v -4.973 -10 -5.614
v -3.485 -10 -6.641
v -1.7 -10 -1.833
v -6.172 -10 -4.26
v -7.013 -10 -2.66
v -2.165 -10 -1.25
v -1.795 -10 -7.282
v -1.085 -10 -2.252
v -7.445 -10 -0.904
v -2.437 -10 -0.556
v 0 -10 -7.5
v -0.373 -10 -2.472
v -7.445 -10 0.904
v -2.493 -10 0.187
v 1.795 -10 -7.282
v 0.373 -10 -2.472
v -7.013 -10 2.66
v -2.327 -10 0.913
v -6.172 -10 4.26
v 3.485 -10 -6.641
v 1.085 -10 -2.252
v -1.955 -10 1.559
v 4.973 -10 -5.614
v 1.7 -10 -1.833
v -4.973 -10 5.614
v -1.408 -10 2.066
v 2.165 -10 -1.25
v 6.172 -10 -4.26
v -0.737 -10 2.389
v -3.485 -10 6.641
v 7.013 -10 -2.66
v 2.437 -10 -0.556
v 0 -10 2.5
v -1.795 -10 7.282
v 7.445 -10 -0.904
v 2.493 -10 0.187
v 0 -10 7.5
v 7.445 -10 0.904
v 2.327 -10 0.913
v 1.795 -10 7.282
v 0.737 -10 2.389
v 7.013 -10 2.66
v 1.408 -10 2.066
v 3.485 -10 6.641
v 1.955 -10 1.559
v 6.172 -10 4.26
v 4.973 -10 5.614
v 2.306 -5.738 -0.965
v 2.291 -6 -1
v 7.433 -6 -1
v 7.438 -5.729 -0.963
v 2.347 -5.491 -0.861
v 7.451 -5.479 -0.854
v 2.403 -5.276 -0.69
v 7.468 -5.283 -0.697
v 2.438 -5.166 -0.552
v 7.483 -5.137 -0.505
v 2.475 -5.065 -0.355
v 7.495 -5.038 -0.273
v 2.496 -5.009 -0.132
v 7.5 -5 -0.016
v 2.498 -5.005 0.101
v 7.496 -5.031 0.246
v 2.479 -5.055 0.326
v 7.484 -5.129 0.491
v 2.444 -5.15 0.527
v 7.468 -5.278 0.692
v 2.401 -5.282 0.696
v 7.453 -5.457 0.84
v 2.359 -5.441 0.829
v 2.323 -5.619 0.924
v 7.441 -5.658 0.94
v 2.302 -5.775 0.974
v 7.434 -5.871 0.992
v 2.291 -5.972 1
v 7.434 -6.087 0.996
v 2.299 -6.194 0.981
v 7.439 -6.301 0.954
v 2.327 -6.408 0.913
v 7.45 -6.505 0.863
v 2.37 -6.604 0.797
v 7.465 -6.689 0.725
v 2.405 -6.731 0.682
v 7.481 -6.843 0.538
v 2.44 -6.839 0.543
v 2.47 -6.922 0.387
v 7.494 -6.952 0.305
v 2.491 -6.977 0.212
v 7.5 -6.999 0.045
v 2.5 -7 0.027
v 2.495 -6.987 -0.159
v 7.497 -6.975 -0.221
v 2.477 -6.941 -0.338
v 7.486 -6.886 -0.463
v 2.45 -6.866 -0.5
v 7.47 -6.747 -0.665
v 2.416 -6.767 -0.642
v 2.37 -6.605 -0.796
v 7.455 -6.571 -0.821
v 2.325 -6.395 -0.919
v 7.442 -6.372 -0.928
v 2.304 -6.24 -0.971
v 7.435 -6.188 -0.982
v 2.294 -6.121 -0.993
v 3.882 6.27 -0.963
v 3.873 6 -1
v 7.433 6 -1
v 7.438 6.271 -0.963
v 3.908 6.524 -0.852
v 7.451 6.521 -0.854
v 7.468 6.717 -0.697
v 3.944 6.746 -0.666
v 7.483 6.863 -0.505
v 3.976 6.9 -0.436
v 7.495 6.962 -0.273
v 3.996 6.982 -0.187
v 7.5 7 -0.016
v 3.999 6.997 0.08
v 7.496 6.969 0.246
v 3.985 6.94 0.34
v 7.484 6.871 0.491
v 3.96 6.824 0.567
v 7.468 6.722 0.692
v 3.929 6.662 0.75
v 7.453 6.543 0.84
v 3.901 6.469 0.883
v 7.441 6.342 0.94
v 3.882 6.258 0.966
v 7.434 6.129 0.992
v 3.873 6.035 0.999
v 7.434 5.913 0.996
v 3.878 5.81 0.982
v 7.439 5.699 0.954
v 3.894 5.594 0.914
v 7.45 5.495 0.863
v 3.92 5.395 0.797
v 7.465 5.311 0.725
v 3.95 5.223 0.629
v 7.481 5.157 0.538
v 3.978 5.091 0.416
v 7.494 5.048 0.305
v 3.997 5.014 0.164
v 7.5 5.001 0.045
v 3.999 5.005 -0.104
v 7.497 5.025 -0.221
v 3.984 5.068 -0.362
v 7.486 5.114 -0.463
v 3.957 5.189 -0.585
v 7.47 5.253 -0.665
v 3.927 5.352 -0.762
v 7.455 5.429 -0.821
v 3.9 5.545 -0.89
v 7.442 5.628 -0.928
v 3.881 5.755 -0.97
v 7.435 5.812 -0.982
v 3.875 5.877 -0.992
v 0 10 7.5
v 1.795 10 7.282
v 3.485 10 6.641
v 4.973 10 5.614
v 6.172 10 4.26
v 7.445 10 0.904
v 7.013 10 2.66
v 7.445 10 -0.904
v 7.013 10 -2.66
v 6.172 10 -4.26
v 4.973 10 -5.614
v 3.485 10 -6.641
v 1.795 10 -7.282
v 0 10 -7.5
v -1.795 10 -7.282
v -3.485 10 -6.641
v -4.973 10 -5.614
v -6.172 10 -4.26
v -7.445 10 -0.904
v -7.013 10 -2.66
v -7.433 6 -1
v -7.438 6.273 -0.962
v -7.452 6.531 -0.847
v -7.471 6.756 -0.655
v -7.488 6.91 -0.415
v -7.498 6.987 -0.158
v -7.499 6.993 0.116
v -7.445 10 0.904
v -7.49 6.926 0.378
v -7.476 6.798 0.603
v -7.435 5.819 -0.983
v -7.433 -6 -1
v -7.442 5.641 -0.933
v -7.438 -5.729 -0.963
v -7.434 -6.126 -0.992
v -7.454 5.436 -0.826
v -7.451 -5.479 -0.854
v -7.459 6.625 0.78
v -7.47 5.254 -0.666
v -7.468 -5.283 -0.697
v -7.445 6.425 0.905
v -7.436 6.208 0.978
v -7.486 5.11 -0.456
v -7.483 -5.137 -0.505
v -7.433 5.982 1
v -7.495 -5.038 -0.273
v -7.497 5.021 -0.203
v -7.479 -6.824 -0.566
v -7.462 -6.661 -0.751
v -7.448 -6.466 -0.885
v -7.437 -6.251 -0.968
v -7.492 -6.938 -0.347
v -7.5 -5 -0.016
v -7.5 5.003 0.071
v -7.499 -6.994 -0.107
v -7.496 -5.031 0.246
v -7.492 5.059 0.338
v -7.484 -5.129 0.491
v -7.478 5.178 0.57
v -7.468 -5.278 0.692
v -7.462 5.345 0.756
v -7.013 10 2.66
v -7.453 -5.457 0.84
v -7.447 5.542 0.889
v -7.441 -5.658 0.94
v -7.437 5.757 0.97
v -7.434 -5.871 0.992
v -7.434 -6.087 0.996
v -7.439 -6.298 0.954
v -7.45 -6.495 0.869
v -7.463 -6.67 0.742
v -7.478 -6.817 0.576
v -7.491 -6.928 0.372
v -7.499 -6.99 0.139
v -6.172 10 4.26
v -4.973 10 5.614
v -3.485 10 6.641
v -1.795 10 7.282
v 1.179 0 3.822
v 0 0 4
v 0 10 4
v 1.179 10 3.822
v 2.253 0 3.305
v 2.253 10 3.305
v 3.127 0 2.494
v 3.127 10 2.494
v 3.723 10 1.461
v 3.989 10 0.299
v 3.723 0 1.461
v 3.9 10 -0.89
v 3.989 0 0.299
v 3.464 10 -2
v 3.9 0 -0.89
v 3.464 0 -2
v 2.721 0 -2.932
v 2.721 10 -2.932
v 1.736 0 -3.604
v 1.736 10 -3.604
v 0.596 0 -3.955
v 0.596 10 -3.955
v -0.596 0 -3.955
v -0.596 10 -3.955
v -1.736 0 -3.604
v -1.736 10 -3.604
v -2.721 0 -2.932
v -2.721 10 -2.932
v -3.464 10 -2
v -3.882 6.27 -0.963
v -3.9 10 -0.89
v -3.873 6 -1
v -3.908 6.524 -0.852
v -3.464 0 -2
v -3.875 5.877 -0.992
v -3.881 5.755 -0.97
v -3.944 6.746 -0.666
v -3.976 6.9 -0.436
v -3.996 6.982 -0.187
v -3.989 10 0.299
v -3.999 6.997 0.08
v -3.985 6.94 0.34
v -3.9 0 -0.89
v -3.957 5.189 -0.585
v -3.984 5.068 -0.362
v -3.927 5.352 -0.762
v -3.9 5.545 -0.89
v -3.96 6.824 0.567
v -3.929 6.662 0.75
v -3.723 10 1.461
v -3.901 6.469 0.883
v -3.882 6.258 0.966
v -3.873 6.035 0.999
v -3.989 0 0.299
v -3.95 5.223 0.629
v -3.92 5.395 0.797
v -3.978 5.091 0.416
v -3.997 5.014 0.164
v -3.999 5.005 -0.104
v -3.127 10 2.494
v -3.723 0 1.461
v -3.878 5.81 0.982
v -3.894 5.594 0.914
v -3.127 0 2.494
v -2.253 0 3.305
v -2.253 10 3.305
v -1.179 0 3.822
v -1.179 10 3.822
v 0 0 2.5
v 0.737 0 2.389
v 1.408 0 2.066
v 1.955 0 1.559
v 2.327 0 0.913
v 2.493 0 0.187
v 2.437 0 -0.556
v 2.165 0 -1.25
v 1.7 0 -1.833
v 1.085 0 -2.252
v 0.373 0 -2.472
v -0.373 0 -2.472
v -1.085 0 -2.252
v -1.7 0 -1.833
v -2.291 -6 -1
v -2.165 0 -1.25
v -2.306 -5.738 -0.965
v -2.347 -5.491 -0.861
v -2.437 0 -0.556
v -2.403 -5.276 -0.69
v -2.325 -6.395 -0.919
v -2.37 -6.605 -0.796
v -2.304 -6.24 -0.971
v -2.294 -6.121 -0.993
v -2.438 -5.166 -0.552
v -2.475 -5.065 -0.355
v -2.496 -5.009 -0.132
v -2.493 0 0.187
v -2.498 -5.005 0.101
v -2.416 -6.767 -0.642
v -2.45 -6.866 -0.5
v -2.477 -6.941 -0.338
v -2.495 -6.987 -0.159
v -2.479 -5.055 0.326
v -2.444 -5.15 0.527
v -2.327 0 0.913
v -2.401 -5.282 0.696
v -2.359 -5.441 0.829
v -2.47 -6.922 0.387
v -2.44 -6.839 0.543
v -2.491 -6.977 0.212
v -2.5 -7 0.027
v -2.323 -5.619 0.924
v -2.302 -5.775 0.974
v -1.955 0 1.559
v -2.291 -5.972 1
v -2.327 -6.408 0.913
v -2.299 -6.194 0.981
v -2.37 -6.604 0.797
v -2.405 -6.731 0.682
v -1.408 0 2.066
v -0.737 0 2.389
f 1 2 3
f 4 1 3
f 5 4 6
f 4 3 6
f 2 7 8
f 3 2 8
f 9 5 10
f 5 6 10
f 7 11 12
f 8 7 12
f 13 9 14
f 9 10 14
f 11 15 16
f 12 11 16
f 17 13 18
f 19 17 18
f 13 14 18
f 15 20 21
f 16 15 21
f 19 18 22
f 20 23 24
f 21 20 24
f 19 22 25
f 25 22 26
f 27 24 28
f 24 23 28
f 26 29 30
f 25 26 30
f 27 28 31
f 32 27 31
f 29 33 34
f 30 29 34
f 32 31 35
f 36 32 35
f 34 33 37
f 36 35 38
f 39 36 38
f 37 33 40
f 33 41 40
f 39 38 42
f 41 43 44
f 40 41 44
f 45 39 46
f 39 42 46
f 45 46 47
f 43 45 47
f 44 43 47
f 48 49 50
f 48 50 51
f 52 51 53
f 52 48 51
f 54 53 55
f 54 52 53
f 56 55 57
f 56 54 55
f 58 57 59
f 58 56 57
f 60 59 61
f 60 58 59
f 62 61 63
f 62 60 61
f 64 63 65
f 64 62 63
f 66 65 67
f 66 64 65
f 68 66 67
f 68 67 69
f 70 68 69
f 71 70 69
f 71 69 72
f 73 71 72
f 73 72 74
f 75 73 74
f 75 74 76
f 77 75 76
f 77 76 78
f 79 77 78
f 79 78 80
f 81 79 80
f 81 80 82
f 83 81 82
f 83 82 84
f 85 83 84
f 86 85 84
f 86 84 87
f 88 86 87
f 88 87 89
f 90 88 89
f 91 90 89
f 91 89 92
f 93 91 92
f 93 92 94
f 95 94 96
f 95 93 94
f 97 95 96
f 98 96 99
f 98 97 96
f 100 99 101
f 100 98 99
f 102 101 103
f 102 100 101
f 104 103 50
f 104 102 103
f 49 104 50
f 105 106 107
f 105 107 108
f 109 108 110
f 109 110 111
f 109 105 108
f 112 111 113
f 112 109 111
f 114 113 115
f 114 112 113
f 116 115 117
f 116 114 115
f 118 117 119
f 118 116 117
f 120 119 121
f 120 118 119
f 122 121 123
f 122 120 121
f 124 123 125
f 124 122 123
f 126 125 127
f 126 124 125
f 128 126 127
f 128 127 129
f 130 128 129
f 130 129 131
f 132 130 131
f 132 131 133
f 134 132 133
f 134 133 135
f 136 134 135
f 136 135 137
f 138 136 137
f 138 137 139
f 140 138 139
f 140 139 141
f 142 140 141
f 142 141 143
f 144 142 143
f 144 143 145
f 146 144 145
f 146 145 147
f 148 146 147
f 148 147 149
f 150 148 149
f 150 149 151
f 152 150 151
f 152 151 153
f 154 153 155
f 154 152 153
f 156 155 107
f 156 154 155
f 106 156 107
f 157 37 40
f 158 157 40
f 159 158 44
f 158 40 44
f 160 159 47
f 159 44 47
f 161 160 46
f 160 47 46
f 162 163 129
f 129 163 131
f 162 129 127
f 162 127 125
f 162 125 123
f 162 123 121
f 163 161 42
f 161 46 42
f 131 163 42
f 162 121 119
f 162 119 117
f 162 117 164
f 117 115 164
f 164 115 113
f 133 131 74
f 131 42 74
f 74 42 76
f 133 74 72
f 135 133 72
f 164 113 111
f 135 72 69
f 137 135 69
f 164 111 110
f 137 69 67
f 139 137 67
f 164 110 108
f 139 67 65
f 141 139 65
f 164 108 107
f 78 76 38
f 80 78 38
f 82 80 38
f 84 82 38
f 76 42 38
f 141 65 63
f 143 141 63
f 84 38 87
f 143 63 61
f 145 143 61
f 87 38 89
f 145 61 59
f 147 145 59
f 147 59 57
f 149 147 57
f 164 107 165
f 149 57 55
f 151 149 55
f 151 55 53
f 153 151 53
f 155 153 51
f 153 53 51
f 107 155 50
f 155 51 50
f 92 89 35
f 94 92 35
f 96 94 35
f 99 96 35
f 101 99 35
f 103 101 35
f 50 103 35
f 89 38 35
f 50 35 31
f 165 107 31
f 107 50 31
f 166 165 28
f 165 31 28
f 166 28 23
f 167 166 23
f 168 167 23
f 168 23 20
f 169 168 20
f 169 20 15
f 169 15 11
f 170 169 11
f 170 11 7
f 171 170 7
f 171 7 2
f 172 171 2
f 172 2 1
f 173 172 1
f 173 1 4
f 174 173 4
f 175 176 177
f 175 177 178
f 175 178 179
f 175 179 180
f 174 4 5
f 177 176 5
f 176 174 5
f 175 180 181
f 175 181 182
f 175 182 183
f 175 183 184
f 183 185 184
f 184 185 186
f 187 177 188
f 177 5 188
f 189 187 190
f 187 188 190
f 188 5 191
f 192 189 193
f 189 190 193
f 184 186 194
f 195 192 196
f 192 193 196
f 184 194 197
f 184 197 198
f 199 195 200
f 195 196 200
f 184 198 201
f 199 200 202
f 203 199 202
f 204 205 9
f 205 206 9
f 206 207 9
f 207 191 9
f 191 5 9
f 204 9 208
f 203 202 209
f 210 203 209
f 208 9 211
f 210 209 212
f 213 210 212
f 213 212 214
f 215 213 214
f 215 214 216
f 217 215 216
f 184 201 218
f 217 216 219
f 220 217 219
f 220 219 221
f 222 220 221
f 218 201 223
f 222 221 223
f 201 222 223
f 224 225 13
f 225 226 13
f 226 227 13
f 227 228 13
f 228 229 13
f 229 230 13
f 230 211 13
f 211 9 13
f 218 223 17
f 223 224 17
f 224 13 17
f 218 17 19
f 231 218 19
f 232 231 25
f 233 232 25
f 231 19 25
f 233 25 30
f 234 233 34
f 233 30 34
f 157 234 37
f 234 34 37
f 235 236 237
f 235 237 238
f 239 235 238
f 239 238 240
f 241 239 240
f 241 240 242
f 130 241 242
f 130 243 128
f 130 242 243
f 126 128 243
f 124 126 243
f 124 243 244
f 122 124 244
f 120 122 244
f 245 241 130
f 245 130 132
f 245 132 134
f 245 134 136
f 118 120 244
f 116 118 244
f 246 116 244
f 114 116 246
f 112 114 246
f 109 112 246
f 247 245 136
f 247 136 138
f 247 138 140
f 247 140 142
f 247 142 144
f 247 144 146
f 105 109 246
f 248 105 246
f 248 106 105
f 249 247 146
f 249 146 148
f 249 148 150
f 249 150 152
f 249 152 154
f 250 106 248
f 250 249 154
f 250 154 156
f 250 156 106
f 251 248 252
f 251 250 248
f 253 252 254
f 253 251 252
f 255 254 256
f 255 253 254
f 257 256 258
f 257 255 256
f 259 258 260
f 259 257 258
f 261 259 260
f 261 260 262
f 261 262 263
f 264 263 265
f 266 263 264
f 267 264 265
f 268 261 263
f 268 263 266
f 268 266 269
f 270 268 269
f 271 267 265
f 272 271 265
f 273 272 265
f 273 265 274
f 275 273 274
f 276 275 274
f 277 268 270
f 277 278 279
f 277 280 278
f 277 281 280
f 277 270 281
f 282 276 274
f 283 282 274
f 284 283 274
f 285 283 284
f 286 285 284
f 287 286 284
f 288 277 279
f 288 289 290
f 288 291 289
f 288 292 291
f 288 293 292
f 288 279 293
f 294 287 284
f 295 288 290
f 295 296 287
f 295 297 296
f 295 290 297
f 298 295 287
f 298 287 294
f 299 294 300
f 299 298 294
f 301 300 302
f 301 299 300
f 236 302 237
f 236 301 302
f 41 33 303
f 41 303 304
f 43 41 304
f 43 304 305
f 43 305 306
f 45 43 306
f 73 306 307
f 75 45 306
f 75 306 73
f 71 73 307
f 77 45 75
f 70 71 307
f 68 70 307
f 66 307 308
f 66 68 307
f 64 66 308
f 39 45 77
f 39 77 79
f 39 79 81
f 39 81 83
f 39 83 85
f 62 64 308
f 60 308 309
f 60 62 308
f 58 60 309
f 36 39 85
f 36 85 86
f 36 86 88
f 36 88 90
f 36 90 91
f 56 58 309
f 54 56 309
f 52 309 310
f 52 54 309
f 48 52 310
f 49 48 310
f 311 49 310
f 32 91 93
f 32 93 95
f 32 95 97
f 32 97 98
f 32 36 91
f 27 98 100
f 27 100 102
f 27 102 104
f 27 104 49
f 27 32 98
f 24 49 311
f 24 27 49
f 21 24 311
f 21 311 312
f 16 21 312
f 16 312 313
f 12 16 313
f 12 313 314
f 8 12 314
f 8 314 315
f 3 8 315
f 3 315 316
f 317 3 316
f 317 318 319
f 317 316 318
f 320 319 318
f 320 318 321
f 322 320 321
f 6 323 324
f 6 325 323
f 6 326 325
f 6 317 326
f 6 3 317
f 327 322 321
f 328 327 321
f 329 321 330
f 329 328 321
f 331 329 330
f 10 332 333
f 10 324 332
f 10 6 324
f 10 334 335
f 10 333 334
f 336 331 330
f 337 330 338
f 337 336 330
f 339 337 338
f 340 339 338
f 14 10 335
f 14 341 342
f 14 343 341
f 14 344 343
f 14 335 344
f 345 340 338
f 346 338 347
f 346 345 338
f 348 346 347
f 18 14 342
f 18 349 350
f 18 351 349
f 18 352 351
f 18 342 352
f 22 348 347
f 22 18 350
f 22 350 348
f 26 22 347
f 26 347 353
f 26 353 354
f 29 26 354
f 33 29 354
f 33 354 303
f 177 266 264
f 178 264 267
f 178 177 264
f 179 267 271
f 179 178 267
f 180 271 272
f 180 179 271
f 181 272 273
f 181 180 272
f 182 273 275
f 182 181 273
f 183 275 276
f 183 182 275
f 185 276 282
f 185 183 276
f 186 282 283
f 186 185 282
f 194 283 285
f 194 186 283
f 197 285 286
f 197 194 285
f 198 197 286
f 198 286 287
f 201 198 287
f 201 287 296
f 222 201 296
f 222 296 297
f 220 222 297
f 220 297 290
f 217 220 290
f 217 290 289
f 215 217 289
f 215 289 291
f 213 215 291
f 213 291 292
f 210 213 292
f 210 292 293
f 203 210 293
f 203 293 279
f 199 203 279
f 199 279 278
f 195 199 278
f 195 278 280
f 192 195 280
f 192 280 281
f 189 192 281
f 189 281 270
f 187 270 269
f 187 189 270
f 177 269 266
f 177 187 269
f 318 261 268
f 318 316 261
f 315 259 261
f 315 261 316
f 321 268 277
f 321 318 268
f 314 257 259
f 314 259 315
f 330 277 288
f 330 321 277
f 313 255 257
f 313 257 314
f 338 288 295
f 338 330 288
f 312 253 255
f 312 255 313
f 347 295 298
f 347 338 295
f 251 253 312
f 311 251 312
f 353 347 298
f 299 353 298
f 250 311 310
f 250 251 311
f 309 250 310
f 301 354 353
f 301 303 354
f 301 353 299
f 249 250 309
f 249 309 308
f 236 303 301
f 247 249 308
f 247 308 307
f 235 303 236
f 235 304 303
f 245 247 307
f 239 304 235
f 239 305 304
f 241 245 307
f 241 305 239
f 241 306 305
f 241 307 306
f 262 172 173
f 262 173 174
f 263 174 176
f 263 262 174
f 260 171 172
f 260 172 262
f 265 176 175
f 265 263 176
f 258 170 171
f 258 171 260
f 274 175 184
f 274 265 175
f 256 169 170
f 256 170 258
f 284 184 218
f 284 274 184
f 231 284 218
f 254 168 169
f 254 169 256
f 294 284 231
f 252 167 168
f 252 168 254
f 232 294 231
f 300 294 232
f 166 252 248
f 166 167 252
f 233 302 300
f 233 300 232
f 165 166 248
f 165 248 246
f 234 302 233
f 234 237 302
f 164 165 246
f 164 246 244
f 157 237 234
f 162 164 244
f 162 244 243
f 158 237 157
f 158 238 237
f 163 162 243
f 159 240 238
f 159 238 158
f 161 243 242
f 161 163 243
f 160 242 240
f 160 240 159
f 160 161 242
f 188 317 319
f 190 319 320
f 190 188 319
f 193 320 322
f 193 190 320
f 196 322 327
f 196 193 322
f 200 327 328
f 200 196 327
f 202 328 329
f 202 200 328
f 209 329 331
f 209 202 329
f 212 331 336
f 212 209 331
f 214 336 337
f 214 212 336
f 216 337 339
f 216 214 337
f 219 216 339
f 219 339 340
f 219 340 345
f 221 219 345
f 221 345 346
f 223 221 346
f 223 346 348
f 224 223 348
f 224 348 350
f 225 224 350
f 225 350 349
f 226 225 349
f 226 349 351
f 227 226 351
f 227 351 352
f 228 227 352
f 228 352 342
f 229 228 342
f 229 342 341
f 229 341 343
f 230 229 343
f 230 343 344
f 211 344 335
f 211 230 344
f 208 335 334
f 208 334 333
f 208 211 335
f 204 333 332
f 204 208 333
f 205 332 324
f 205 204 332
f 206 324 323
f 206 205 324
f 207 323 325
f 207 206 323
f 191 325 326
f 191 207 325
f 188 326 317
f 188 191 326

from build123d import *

# Parameters (mm, degrees)
SKETCH1_R               = 7.5
SKETCH1_R_2             = 4
BOSS_EXTRUDE2_DEPTH     = 10
BOSS_EXTRUDE3_START     = -10
SKETCH1_3_R             = 7.5
SKETCH1_3_R_2           = 2.5
BOSS_EXTRUDE3_DEPTH     = 10
CUT_EXTRUDE1_DEPTH      = 15.577379737
CUT_EXTRUDE1_DEPTH_BACK = 15.577379737
SKETCH2_R               = 1


with BuildPart() as part:
    # Sketch1 → Boss-Extrude2 (new body)
    with BuildSketch(Plane(origin=(0, 0, 0), x_dir=(1, 0, 0), z_dir=(0, 1, 0))):
        Circle(SKETCH1_R)
        Circle(SKETCH1_R_2, mode=Mode.SUBTRACT)
    extrude(amount=BOSS_EXTRUDE2_DEPTH)

    # Sketch1<3> → Boss-Extrude3 (add)
    with BuildSketch(Plane(origin=(0, 0, 0), x_dir=(1, 0, 0), z_dir=(0, 1, 0)).offset(BOSS_EXTRUDE3_START)):
        Circle(SKETCH1_3_R)
        Circle(SKETCH1_3_R_2, mode=Mode.SUBTRACT)
    extrude(amount=BOSS_EXTRUDE3_DEPTH)

    # Sketch2 → Cut-Extrude1 (cut, two sides: drawn at the far end of the back side and taken through both)
    with BuildSketch(Plane(origin=(0, 0, 0), x_dir=(0, 0, -1), z_dir=(1, 0, 0)).offset(-CUT_EXTRUDE1_DEPTH_BACK)):
        with Locations((0, 6)):
            Circle(SKETCH2_R)
        with Locations((0, -6)):
            Circle(SKETCH2_R)
    extrude(amount=CUT_EXTRUDE1_DEPTH + CUT_EXTRUDE1_DEPTH_BACK, mode=Mode.SUBTRACT)


solid = part.part
